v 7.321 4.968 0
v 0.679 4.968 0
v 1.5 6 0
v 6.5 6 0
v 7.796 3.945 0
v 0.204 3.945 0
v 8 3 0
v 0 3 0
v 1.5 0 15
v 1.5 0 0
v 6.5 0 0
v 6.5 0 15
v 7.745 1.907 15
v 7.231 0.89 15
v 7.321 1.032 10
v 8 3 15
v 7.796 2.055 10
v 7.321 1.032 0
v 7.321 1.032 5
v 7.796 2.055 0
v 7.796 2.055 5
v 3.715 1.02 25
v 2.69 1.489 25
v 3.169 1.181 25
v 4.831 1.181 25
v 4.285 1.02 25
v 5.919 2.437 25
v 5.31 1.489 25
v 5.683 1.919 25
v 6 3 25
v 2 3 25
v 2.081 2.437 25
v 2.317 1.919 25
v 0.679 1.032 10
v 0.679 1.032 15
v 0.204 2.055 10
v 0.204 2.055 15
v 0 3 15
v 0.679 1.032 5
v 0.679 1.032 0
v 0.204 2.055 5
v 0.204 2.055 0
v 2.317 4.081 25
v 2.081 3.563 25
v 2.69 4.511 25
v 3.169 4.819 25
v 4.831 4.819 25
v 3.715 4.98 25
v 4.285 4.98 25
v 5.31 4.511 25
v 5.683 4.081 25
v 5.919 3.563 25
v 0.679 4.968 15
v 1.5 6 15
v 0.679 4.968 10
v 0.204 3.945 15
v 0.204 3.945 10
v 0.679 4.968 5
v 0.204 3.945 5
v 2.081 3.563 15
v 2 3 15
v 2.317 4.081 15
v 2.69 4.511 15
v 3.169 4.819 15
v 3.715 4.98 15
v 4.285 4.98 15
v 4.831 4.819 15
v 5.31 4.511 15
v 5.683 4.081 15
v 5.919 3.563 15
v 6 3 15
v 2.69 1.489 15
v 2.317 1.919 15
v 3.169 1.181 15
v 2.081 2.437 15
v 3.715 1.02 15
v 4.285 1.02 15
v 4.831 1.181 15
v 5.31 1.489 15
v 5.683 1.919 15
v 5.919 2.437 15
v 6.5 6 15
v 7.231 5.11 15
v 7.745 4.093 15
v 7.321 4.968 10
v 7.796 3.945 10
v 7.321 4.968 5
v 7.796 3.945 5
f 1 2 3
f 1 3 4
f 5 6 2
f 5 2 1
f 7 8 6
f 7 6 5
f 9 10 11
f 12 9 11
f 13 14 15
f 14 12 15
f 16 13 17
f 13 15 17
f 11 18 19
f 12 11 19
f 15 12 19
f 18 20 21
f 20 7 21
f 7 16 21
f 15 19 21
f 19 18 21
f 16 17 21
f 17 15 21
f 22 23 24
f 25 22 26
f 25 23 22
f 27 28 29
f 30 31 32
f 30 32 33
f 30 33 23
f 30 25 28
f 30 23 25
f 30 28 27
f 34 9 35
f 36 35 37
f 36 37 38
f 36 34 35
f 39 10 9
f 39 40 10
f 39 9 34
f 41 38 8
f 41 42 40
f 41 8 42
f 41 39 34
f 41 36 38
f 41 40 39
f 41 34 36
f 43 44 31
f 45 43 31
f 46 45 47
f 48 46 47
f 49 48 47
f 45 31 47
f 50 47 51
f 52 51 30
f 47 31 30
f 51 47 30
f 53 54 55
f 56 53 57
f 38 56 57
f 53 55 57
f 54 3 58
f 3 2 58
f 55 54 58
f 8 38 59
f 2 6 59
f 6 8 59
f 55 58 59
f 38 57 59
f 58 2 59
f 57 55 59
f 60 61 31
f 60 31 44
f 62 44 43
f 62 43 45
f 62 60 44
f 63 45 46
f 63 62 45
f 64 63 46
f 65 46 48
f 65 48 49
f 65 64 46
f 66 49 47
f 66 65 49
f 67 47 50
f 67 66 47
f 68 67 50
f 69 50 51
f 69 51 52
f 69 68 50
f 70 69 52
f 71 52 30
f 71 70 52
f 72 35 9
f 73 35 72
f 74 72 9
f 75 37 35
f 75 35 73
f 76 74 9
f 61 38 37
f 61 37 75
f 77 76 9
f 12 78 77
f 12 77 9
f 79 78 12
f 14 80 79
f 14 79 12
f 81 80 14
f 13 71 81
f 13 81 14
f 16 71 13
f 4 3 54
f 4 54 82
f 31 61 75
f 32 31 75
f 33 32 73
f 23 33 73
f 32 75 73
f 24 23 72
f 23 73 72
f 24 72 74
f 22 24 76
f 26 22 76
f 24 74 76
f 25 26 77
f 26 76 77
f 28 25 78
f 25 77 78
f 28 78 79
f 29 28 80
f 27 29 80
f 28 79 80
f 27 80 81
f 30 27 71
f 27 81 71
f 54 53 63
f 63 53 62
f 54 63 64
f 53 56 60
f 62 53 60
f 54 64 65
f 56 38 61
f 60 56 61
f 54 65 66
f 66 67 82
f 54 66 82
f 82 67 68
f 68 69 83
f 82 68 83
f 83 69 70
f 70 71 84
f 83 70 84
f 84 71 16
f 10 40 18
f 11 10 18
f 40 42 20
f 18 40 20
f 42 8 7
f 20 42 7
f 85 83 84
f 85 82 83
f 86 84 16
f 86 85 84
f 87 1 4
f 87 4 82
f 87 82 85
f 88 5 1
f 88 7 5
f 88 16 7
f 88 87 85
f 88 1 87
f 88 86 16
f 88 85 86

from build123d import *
from build123d.topology import SkipClean

# Parameters (mm, degrees)
SKETCH1_W               = 8
SKETCH1_H               = 6
BOSS_EXTRUDE1_DEPTH     = 15
SKETCH2_R               = 2
BOSS_EXTRUDE2_DEPTH     = 10
CUT_EXTRUDE1_DEPTH      = 27.925824036
CIRPATTERN1_DEPTH       = 15
CUT_EXTRUDE2_DEPTH      = 27.925824088
CUT_EXTRUDE2_DEPTH_BACK = 27.925824088
SKETCH4_W               = 8
SKETCH4_H               = 3


# Read off the part's stored shape, not the designer's step: CirPattern1
with BuildPart() as part:
    # Sketch1 → Boss-Extrude1 (new body)
    with BuildSketch(Plane.XY):
        with Locations((4, 3)):
            Rectangle(SKETCH1_W, SKETCH1_H)
    extrude(amount=BOSS_EXTRUDE1_DEPTH)

    # Sketch2 → Boss-Extrude2 (add)
    with BuildSketch(Plane.XY.offset(15)):
        with Locations((4, 3)):
            Circle(SKETCH2_R)
    extrude(amount=BOSS_EXTRUDE2_DEPTH)

    # Sketch3 → Cut-Extrude1 (cut, through all)
    with BuildSketch(Plane(origin=(0, 0, 0), x_dir=(-1, 0, 0), z_dir=(0, 0, -1))):
        with BuildLine():
            Line((-8, 0), (-6.5, 0))
            add(Edge.make_bspline(
                [(-6.5, 0), (-7.519049776, 1.013941068), (-7.906316023, 2.115854023), (-8, 3)],
                knots=[0, 0, 0, 0, 1, 1, 1, 1], degree=3))
            Line((-8, 3), (-8, 0))
        make_face()
    extrude(amount=-CUT_EXTRUDE1_DEPTH, mode=Mode.SUBTRACT)

    # CirPattern1 outline → CirPattern1 (cut)
    with BuildSketch(Plane.XY):
        with BuildLine():
            Line((0, 0), (1.5, 0))
            add(Edge.make_bspline(
                [(1.5, 0), (0.480950224, 1.013941068), (0.093683977, 2.115854023), (0, 3)],
                knots=[0, 0, 0, 0, 1, 1, 1, 1], degree=3))
            Line((0, 3), (0, 0))
        make_face()
    extrude(amount=CIRPATTERN1_DEPTH, mode=Mode.SUBTRACT)

    # Sketch4 → Cut-Extrude2 (cut, two sides: drawn at the far end of the back side and taken through both)
    with BuildSketch(Plane(origin=(0, 0, 0), x_dir=(-1, 0, 0), z_dir=(0, 0, -1)).offset(-CUT_EXTRUDE2_DEPTH_BACK)):
        with Locations((-4, 4.5)):
            Rectangle(SKETCH4_W, SKETCH4_H)
    extrude(amount=CUT_EXTRUDE2_DEPTH + CUT_EXTRUDE2_DEPTH_BACK, mode=Mode.SUBTRACT)

    # Mirror1: part across plane


with BuildPart() as part_1:
    with SkipClean():  # the faces are left unmerged after this step: merging them gives an invalid solid
        add(part.part)
        add(part.part.mirror(Plane(origin=(8, 3, 25), x_dir=(0, 0, 1), z_dir=(0, -1, 0))))


solid = part_1.part
